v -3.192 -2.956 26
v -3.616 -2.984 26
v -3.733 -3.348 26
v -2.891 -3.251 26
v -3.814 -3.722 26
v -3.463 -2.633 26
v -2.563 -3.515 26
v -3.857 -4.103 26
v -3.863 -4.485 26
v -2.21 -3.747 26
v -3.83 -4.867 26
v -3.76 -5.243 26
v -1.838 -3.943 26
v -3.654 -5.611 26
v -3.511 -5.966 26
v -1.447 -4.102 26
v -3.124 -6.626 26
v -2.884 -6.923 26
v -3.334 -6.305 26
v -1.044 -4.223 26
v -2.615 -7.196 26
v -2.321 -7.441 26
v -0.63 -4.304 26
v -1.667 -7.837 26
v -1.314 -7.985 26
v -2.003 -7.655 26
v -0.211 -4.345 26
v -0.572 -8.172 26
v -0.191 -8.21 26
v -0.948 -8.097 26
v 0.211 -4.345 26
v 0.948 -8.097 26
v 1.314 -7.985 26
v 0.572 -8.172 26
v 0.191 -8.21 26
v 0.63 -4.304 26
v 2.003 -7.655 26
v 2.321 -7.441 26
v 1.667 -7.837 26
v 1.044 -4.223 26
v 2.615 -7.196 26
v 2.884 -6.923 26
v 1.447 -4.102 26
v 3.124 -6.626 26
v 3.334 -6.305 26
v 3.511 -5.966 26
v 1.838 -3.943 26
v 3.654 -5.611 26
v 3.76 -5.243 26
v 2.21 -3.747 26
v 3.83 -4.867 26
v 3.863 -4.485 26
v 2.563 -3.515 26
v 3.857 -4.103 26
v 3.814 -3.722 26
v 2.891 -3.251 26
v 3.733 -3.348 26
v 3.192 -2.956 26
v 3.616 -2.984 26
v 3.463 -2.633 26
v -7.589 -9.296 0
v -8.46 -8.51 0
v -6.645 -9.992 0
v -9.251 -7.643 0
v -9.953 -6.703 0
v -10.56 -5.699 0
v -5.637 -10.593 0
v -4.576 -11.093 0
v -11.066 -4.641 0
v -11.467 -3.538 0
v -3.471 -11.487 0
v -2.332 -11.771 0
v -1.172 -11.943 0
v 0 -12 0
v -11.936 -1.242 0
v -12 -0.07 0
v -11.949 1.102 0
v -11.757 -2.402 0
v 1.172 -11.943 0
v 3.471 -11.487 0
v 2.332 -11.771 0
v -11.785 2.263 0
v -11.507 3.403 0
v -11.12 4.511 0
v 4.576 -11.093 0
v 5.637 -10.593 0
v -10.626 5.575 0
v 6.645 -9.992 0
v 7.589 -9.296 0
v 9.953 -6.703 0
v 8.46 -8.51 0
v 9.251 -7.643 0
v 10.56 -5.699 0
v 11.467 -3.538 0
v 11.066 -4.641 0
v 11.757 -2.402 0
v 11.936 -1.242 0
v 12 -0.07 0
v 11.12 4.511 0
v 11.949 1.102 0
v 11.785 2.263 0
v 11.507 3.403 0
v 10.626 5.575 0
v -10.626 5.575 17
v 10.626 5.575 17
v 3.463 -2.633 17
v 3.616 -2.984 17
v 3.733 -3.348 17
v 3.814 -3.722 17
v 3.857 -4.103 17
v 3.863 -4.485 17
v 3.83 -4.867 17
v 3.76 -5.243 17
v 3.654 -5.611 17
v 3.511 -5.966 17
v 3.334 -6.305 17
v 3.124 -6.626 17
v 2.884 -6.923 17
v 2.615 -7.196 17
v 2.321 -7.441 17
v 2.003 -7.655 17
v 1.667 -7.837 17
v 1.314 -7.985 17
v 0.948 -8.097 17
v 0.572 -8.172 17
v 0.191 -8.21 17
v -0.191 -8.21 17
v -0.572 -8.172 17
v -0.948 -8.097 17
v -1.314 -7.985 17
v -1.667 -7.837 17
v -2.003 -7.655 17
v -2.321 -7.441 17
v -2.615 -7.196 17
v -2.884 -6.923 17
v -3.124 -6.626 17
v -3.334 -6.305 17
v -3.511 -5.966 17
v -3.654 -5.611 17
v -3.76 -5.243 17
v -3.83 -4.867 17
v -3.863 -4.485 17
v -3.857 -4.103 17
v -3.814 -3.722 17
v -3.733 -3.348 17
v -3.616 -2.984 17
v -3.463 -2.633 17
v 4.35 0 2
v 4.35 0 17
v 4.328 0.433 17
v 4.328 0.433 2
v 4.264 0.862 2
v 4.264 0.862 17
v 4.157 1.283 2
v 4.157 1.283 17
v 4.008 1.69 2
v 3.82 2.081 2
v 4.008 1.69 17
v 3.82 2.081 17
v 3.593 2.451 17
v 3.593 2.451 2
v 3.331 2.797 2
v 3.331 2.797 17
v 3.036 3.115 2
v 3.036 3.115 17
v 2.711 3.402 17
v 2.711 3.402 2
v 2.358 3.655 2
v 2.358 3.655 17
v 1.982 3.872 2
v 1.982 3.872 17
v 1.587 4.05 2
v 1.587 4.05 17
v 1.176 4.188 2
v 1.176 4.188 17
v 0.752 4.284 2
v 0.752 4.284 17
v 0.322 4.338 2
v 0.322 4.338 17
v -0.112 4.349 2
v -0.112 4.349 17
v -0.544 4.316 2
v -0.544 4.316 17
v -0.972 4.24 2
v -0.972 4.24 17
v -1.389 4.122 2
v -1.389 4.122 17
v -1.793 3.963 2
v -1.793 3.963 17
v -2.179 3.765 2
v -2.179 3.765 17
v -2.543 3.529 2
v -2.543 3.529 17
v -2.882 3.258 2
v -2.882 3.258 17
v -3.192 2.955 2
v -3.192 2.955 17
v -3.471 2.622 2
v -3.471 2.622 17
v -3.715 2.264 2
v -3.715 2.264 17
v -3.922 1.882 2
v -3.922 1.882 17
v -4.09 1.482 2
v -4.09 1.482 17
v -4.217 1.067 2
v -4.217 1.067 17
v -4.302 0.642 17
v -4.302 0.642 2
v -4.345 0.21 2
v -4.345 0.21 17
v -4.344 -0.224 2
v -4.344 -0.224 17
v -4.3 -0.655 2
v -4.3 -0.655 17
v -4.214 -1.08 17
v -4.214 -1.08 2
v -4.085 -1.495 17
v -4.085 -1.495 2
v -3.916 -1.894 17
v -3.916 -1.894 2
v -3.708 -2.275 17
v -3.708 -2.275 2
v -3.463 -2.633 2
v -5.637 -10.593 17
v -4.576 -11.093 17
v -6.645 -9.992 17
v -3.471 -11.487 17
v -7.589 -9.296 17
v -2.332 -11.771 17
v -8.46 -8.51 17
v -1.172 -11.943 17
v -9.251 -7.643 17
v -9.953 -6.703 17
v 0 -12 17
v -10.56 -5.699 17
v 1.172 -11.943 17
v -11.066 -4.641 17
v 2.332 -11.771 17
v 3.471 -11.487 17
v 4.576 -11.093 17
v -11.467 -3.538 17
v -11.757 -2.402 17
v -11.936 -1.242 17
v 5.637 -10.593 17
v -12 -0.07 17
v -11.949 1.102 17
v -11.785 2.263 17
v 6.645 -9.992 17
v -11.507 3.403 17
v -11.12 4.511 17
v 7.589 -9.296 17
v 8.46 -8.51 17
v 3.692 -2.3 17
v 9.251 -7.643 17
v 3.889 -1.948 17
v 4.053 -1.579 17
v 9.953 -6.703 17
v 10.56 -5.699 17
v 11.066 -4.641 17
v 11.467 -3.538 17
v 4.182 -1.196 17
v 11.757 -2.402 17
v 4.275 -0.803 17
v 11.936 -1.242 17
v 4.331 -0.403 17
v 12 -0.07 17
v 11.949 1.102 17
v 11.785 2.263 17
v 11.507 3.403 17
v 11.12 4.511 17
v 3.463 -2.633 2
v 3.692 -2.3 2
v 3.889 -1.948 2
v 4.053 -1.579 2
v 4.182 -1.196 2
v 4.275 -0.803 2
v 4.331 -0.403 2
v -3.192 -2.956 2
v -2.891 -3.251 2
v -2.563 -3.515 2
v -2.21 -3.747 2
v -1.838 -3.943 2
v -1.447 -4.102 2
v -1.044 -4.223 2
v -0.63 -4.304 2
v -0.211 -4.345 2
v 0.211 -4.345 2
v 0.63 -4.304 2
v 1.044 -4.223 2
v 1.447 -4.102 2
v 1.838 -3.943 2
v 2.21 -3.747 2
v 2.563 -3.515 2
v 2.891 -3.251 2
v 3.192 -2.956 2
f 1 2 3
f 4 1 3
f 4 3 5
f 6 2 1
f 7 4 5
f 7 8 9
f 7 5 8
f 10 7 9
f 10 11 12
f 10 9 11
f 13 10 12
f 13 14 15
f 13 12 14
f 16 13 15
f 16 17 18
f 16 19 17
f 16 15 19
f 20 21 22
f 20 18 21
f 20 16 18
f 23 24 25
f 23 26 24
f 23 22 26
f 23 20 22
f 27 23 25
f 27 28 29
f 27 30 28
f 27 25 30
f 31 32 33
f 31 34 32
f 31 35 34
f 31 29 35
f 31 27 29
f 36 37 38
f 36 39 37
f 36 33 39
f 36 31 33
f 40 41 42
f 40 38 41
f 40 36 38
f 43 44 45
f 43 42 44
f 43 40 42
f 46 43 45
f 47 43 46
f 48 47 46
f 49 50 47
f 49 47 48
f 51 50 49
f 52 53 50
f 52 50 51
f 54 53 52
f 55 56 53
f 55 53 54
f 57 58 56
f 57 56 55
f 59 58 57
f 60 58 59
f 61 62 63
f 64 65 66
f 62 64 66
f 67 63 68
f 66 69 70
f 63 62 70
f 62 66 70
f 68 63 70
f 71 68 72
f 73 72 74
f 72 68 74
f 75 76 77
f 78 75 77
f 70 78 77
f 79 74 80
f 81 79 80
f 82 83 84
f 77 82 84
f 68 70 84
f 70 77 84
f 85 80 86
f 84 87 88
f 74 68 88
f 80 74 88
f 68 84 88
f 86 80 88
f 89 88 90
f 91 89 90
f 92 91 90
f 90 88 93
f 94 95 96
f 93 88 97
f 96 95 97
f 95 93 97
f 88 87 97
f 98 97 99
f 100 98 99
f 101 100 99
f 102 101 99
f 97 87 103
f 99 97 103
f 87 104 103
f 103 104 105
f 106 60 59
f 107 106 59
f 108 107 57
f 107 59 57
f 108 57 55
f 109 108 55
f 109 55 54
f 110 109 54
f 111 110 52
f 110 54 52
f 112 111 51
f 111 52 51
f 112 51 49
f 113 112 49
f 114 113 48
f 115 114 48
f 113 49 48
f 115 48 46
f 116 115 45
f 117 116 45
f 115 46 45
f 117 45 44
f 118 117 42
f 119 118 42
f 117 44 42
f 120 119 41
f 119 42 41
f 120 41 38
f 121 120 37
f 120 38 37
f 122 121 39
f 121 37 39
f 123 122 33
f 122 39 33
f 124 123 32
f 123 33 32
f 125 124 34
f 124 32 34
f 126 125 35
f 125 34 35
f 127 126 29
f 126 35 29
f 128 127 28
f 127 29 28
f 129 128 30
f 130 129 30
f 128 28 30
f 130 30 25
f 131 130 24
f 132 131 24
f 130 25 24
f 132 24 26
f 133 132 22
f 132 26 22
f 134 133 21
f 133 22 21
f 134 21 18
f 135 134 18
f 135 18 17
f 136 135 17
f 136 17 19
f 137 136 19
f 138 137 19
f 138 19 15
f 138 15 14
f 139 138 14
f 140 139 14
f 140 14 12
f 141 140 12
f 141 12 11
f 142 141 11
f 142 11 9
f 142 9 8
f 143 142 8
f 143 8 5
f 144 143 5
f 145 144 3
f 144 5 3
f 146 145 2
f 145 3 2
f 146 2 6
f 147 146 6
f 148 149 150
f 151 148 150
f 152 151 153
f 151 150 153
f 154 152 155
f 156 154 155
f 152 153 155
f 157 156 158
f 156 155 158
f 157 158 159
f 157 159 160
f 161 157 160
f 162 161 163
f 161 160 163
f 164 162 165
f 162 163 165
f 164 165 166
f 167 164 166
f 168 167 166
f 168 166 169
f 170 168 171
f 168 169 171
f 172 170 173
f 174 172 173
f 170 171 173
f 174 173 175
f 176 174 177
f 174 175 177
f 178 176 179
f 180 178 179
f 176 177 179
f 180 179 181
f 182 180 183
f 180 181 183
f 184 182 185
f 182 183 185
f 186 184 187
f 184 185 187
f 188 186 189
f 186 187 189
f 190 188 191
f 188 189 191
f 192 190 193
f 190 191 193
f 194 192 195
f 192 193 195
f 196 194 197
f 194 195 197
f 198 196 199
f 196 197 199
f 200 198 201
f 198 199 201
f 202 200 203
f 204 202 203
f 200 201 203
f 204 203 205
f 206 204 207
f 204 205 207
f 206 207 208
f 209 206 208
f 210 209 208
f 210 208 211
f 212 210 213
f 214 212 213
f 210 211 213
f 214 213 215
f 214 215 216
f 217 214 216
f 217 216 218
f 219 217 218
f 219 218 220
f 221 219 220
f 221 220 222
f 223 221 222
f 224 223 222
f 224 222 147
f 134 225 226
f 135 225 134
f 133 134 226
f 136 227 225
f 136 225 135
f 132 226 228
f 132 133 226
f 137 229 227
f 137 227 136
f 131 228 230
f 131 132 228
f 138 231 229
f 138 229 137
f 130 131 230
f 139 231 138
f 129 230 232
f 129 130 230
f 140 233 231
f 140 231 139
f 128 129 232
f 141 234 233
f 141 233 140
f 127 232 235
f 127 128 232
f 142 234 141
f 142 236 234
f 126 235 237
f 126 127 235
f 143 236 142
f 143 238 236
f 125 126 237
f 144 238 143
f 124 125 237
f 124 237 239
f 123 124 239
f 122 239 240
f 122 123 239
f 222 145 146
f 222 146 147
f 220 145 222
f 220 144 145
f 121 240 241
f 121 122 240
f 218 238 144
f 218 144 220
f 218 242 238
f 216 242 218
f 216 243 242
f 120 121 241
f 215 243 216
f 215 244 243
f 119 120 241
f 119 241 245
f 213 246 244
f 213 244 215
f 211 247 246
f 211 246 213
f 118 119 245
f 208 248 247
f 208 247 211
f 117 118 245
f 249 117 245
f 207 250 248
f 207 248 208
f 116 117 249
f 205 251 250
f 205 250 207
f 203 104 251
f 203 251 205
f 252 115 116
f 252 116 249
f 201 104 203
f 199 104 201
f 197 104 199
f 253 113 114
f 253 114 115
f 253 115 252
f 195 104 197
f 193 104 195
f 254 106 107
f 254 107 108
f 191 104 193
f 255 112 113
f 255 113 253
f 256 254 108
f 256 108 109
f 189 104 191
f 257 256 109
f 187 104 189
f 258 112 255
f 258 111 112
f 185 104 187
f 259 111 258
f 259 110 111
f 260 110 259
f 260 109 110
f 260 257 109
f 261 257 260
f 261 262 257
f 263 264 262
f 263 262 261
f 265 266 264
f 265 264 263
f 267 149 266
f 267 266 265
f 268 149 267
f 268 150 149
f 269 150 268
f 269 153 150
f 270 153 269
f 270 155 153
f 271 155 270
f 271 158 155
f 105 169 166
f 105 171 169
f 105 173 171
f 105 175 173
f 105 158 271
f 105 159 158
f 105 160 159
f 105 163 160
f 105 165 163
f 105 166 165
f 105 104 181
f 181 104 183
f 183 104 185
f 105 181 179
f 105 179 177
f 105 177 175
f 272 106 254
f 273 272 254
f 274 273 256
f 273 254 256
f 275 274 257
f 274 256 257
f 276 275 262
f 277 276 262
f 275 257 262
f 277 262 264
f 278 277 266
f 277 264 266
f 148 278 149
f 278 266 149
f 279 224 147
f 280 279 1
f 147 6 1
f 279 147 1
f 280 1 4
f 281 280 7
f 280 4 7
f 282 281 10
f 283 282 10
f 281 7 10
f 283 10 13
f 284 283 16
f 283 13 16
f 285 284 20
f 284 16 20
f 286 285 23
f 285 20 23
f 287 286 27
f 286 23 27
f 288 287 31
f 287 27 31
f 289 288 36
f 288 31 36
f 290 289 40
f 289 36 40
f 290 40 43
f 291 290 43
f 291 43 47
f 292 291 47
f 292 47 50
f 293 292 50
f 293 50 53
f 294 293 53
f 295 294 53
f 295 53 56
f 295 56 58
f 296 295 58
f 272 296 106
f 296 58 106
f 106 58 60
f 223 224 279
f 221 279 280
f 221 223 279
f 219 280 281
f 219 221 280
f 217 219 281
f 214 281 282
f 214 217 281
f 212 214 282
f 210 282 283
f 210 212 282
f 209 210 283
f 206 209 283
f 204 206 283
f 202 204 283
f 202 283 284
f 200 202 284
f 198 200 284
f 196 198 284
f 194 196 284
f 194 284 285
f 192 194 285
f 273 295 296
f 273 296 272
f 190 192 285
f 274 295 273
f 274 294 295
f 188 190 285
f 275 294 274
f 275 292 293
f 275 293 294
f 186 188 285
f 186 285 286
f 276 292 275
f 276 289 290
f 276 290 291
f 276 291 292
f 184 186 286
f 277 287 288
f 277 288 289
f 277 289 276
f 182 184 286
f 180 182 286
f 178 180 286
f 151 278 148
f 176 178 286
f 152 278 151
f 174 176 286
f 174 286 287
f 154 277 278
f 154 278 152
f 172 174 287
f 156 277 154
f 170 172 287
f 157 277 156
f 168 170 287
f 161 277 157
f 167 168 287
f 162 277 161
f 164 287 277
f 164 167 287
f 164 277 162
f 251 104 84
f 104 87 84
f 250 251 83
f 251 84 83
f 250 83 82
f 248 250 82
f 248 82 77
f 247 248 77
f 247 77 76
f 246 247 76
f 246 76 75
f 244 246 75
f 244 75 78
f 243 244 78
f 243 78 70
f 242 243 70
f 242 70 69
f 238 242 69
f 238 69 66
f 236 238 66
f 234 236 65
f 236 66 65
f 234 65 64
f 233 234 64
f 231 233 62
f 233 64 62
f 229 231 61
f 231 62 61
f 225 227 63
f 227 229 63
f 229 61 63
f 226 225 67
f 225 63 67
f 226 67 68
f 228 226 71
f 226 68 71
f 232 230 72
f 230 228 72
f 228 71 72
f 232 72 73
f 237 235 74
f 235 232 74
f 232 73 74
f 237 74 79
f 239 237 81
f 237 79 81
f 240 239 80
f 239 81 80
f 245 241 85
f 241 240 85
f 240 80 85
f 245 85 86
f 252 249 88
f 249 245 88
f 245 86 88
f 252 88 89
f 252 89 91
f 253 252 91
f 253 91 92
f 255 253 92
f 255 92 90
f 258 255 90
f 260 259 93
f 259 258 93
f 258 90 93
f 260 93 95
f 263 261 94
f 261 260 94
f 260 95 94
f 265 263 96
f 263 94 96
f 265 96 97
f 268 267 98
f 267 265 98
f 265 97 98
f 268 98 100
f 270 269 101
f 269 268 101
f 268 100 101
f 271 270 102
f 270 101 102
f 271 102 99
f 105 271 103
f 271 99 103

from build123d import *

# Parameters (mm, degrees)
F0_R     = 12
F1_DEPTH = 26
F2_R     = 12
F3_DEPTH = 9
F5_DEPTH = 15
F7_W     = 12
F7_H     = 17
F8_DEPTH = 6.425


with BuildPart() as f1:
    # F0 (on Top) → F1 (new body)
    with BuildSketch(Plane.XY):
        Circle(F0_R)
    extrude(amount=F1_DEPTH)

    # F2 (on face) → F3 (cut)
    with BuildSketch(Plane.XY.offset(26)):
        Circle(F2_R)
        with BuildLine():
            ThreePointArc((-3.462659053, -2.6329626437), (-1.3892323635, 4.1222000728), (4.35, 0))
            ThreePointArc((4.35, 0), (4.1222000728, -1.3892323635), (3.462659053, -2.6329626437))
            ThreePointArc((3.462659053, -2.6329626437), (0, -8.215), (-3.462659053, -2.6329626437))
        make_face(mode=Mode.SUBTRACT)
        with BuildLine():
            ThreePointArc((3.462659053, -2.6329626437), (4.1222000728, -1.3892323635), (4.35, 0))
            ThreePointArc((4.35, 0), (-1.3892323635, 4.1222000728), (-3.462659053, -2.6329626437))
            ThreePointArc((-3.462659053, -2.6329626437), (0, -4.35), (3.462659053, -2.6329626437))
        make_face()
    extrude(amount=-F3_DEPTH, mode=Mode.SUBTRACT)

    # F4 (on face) → F5 (cut)
    with BuildSketch(Plane.XY.offset(17)):
        with BuildLine():
            ThreePointArc((3.462659053, -2.6329626437), (4.1222000728, -1.3892323635), (4.35, 0))
            ThreePointArc((4.35, 0), (-1.3892323635, 4.1222000728), (-3.462659053, -2.6329626437))
            ThreePointArc((-3.462659053, -2.6329626437), (0, -4.35), (3.462659053, -2.6329626437))
        make_face()
    extrude(amount=-F5_DEPTH, mode=Mode.SUBTRACT)

    # F7 (on offset) → F8 (cut)
    with BuildSketch(Plane.XZ.offset(-12)):
        with Locations((6, 8.5)):
            Rectangle(F7_W, F7_H)
        with Locations((-6, 8.5)):
            Rectangle(F7_W, F7_H)
    extrude(amount=F8_DEPTH, mode=Mode.SUBTRACT)


solid = f1.part
